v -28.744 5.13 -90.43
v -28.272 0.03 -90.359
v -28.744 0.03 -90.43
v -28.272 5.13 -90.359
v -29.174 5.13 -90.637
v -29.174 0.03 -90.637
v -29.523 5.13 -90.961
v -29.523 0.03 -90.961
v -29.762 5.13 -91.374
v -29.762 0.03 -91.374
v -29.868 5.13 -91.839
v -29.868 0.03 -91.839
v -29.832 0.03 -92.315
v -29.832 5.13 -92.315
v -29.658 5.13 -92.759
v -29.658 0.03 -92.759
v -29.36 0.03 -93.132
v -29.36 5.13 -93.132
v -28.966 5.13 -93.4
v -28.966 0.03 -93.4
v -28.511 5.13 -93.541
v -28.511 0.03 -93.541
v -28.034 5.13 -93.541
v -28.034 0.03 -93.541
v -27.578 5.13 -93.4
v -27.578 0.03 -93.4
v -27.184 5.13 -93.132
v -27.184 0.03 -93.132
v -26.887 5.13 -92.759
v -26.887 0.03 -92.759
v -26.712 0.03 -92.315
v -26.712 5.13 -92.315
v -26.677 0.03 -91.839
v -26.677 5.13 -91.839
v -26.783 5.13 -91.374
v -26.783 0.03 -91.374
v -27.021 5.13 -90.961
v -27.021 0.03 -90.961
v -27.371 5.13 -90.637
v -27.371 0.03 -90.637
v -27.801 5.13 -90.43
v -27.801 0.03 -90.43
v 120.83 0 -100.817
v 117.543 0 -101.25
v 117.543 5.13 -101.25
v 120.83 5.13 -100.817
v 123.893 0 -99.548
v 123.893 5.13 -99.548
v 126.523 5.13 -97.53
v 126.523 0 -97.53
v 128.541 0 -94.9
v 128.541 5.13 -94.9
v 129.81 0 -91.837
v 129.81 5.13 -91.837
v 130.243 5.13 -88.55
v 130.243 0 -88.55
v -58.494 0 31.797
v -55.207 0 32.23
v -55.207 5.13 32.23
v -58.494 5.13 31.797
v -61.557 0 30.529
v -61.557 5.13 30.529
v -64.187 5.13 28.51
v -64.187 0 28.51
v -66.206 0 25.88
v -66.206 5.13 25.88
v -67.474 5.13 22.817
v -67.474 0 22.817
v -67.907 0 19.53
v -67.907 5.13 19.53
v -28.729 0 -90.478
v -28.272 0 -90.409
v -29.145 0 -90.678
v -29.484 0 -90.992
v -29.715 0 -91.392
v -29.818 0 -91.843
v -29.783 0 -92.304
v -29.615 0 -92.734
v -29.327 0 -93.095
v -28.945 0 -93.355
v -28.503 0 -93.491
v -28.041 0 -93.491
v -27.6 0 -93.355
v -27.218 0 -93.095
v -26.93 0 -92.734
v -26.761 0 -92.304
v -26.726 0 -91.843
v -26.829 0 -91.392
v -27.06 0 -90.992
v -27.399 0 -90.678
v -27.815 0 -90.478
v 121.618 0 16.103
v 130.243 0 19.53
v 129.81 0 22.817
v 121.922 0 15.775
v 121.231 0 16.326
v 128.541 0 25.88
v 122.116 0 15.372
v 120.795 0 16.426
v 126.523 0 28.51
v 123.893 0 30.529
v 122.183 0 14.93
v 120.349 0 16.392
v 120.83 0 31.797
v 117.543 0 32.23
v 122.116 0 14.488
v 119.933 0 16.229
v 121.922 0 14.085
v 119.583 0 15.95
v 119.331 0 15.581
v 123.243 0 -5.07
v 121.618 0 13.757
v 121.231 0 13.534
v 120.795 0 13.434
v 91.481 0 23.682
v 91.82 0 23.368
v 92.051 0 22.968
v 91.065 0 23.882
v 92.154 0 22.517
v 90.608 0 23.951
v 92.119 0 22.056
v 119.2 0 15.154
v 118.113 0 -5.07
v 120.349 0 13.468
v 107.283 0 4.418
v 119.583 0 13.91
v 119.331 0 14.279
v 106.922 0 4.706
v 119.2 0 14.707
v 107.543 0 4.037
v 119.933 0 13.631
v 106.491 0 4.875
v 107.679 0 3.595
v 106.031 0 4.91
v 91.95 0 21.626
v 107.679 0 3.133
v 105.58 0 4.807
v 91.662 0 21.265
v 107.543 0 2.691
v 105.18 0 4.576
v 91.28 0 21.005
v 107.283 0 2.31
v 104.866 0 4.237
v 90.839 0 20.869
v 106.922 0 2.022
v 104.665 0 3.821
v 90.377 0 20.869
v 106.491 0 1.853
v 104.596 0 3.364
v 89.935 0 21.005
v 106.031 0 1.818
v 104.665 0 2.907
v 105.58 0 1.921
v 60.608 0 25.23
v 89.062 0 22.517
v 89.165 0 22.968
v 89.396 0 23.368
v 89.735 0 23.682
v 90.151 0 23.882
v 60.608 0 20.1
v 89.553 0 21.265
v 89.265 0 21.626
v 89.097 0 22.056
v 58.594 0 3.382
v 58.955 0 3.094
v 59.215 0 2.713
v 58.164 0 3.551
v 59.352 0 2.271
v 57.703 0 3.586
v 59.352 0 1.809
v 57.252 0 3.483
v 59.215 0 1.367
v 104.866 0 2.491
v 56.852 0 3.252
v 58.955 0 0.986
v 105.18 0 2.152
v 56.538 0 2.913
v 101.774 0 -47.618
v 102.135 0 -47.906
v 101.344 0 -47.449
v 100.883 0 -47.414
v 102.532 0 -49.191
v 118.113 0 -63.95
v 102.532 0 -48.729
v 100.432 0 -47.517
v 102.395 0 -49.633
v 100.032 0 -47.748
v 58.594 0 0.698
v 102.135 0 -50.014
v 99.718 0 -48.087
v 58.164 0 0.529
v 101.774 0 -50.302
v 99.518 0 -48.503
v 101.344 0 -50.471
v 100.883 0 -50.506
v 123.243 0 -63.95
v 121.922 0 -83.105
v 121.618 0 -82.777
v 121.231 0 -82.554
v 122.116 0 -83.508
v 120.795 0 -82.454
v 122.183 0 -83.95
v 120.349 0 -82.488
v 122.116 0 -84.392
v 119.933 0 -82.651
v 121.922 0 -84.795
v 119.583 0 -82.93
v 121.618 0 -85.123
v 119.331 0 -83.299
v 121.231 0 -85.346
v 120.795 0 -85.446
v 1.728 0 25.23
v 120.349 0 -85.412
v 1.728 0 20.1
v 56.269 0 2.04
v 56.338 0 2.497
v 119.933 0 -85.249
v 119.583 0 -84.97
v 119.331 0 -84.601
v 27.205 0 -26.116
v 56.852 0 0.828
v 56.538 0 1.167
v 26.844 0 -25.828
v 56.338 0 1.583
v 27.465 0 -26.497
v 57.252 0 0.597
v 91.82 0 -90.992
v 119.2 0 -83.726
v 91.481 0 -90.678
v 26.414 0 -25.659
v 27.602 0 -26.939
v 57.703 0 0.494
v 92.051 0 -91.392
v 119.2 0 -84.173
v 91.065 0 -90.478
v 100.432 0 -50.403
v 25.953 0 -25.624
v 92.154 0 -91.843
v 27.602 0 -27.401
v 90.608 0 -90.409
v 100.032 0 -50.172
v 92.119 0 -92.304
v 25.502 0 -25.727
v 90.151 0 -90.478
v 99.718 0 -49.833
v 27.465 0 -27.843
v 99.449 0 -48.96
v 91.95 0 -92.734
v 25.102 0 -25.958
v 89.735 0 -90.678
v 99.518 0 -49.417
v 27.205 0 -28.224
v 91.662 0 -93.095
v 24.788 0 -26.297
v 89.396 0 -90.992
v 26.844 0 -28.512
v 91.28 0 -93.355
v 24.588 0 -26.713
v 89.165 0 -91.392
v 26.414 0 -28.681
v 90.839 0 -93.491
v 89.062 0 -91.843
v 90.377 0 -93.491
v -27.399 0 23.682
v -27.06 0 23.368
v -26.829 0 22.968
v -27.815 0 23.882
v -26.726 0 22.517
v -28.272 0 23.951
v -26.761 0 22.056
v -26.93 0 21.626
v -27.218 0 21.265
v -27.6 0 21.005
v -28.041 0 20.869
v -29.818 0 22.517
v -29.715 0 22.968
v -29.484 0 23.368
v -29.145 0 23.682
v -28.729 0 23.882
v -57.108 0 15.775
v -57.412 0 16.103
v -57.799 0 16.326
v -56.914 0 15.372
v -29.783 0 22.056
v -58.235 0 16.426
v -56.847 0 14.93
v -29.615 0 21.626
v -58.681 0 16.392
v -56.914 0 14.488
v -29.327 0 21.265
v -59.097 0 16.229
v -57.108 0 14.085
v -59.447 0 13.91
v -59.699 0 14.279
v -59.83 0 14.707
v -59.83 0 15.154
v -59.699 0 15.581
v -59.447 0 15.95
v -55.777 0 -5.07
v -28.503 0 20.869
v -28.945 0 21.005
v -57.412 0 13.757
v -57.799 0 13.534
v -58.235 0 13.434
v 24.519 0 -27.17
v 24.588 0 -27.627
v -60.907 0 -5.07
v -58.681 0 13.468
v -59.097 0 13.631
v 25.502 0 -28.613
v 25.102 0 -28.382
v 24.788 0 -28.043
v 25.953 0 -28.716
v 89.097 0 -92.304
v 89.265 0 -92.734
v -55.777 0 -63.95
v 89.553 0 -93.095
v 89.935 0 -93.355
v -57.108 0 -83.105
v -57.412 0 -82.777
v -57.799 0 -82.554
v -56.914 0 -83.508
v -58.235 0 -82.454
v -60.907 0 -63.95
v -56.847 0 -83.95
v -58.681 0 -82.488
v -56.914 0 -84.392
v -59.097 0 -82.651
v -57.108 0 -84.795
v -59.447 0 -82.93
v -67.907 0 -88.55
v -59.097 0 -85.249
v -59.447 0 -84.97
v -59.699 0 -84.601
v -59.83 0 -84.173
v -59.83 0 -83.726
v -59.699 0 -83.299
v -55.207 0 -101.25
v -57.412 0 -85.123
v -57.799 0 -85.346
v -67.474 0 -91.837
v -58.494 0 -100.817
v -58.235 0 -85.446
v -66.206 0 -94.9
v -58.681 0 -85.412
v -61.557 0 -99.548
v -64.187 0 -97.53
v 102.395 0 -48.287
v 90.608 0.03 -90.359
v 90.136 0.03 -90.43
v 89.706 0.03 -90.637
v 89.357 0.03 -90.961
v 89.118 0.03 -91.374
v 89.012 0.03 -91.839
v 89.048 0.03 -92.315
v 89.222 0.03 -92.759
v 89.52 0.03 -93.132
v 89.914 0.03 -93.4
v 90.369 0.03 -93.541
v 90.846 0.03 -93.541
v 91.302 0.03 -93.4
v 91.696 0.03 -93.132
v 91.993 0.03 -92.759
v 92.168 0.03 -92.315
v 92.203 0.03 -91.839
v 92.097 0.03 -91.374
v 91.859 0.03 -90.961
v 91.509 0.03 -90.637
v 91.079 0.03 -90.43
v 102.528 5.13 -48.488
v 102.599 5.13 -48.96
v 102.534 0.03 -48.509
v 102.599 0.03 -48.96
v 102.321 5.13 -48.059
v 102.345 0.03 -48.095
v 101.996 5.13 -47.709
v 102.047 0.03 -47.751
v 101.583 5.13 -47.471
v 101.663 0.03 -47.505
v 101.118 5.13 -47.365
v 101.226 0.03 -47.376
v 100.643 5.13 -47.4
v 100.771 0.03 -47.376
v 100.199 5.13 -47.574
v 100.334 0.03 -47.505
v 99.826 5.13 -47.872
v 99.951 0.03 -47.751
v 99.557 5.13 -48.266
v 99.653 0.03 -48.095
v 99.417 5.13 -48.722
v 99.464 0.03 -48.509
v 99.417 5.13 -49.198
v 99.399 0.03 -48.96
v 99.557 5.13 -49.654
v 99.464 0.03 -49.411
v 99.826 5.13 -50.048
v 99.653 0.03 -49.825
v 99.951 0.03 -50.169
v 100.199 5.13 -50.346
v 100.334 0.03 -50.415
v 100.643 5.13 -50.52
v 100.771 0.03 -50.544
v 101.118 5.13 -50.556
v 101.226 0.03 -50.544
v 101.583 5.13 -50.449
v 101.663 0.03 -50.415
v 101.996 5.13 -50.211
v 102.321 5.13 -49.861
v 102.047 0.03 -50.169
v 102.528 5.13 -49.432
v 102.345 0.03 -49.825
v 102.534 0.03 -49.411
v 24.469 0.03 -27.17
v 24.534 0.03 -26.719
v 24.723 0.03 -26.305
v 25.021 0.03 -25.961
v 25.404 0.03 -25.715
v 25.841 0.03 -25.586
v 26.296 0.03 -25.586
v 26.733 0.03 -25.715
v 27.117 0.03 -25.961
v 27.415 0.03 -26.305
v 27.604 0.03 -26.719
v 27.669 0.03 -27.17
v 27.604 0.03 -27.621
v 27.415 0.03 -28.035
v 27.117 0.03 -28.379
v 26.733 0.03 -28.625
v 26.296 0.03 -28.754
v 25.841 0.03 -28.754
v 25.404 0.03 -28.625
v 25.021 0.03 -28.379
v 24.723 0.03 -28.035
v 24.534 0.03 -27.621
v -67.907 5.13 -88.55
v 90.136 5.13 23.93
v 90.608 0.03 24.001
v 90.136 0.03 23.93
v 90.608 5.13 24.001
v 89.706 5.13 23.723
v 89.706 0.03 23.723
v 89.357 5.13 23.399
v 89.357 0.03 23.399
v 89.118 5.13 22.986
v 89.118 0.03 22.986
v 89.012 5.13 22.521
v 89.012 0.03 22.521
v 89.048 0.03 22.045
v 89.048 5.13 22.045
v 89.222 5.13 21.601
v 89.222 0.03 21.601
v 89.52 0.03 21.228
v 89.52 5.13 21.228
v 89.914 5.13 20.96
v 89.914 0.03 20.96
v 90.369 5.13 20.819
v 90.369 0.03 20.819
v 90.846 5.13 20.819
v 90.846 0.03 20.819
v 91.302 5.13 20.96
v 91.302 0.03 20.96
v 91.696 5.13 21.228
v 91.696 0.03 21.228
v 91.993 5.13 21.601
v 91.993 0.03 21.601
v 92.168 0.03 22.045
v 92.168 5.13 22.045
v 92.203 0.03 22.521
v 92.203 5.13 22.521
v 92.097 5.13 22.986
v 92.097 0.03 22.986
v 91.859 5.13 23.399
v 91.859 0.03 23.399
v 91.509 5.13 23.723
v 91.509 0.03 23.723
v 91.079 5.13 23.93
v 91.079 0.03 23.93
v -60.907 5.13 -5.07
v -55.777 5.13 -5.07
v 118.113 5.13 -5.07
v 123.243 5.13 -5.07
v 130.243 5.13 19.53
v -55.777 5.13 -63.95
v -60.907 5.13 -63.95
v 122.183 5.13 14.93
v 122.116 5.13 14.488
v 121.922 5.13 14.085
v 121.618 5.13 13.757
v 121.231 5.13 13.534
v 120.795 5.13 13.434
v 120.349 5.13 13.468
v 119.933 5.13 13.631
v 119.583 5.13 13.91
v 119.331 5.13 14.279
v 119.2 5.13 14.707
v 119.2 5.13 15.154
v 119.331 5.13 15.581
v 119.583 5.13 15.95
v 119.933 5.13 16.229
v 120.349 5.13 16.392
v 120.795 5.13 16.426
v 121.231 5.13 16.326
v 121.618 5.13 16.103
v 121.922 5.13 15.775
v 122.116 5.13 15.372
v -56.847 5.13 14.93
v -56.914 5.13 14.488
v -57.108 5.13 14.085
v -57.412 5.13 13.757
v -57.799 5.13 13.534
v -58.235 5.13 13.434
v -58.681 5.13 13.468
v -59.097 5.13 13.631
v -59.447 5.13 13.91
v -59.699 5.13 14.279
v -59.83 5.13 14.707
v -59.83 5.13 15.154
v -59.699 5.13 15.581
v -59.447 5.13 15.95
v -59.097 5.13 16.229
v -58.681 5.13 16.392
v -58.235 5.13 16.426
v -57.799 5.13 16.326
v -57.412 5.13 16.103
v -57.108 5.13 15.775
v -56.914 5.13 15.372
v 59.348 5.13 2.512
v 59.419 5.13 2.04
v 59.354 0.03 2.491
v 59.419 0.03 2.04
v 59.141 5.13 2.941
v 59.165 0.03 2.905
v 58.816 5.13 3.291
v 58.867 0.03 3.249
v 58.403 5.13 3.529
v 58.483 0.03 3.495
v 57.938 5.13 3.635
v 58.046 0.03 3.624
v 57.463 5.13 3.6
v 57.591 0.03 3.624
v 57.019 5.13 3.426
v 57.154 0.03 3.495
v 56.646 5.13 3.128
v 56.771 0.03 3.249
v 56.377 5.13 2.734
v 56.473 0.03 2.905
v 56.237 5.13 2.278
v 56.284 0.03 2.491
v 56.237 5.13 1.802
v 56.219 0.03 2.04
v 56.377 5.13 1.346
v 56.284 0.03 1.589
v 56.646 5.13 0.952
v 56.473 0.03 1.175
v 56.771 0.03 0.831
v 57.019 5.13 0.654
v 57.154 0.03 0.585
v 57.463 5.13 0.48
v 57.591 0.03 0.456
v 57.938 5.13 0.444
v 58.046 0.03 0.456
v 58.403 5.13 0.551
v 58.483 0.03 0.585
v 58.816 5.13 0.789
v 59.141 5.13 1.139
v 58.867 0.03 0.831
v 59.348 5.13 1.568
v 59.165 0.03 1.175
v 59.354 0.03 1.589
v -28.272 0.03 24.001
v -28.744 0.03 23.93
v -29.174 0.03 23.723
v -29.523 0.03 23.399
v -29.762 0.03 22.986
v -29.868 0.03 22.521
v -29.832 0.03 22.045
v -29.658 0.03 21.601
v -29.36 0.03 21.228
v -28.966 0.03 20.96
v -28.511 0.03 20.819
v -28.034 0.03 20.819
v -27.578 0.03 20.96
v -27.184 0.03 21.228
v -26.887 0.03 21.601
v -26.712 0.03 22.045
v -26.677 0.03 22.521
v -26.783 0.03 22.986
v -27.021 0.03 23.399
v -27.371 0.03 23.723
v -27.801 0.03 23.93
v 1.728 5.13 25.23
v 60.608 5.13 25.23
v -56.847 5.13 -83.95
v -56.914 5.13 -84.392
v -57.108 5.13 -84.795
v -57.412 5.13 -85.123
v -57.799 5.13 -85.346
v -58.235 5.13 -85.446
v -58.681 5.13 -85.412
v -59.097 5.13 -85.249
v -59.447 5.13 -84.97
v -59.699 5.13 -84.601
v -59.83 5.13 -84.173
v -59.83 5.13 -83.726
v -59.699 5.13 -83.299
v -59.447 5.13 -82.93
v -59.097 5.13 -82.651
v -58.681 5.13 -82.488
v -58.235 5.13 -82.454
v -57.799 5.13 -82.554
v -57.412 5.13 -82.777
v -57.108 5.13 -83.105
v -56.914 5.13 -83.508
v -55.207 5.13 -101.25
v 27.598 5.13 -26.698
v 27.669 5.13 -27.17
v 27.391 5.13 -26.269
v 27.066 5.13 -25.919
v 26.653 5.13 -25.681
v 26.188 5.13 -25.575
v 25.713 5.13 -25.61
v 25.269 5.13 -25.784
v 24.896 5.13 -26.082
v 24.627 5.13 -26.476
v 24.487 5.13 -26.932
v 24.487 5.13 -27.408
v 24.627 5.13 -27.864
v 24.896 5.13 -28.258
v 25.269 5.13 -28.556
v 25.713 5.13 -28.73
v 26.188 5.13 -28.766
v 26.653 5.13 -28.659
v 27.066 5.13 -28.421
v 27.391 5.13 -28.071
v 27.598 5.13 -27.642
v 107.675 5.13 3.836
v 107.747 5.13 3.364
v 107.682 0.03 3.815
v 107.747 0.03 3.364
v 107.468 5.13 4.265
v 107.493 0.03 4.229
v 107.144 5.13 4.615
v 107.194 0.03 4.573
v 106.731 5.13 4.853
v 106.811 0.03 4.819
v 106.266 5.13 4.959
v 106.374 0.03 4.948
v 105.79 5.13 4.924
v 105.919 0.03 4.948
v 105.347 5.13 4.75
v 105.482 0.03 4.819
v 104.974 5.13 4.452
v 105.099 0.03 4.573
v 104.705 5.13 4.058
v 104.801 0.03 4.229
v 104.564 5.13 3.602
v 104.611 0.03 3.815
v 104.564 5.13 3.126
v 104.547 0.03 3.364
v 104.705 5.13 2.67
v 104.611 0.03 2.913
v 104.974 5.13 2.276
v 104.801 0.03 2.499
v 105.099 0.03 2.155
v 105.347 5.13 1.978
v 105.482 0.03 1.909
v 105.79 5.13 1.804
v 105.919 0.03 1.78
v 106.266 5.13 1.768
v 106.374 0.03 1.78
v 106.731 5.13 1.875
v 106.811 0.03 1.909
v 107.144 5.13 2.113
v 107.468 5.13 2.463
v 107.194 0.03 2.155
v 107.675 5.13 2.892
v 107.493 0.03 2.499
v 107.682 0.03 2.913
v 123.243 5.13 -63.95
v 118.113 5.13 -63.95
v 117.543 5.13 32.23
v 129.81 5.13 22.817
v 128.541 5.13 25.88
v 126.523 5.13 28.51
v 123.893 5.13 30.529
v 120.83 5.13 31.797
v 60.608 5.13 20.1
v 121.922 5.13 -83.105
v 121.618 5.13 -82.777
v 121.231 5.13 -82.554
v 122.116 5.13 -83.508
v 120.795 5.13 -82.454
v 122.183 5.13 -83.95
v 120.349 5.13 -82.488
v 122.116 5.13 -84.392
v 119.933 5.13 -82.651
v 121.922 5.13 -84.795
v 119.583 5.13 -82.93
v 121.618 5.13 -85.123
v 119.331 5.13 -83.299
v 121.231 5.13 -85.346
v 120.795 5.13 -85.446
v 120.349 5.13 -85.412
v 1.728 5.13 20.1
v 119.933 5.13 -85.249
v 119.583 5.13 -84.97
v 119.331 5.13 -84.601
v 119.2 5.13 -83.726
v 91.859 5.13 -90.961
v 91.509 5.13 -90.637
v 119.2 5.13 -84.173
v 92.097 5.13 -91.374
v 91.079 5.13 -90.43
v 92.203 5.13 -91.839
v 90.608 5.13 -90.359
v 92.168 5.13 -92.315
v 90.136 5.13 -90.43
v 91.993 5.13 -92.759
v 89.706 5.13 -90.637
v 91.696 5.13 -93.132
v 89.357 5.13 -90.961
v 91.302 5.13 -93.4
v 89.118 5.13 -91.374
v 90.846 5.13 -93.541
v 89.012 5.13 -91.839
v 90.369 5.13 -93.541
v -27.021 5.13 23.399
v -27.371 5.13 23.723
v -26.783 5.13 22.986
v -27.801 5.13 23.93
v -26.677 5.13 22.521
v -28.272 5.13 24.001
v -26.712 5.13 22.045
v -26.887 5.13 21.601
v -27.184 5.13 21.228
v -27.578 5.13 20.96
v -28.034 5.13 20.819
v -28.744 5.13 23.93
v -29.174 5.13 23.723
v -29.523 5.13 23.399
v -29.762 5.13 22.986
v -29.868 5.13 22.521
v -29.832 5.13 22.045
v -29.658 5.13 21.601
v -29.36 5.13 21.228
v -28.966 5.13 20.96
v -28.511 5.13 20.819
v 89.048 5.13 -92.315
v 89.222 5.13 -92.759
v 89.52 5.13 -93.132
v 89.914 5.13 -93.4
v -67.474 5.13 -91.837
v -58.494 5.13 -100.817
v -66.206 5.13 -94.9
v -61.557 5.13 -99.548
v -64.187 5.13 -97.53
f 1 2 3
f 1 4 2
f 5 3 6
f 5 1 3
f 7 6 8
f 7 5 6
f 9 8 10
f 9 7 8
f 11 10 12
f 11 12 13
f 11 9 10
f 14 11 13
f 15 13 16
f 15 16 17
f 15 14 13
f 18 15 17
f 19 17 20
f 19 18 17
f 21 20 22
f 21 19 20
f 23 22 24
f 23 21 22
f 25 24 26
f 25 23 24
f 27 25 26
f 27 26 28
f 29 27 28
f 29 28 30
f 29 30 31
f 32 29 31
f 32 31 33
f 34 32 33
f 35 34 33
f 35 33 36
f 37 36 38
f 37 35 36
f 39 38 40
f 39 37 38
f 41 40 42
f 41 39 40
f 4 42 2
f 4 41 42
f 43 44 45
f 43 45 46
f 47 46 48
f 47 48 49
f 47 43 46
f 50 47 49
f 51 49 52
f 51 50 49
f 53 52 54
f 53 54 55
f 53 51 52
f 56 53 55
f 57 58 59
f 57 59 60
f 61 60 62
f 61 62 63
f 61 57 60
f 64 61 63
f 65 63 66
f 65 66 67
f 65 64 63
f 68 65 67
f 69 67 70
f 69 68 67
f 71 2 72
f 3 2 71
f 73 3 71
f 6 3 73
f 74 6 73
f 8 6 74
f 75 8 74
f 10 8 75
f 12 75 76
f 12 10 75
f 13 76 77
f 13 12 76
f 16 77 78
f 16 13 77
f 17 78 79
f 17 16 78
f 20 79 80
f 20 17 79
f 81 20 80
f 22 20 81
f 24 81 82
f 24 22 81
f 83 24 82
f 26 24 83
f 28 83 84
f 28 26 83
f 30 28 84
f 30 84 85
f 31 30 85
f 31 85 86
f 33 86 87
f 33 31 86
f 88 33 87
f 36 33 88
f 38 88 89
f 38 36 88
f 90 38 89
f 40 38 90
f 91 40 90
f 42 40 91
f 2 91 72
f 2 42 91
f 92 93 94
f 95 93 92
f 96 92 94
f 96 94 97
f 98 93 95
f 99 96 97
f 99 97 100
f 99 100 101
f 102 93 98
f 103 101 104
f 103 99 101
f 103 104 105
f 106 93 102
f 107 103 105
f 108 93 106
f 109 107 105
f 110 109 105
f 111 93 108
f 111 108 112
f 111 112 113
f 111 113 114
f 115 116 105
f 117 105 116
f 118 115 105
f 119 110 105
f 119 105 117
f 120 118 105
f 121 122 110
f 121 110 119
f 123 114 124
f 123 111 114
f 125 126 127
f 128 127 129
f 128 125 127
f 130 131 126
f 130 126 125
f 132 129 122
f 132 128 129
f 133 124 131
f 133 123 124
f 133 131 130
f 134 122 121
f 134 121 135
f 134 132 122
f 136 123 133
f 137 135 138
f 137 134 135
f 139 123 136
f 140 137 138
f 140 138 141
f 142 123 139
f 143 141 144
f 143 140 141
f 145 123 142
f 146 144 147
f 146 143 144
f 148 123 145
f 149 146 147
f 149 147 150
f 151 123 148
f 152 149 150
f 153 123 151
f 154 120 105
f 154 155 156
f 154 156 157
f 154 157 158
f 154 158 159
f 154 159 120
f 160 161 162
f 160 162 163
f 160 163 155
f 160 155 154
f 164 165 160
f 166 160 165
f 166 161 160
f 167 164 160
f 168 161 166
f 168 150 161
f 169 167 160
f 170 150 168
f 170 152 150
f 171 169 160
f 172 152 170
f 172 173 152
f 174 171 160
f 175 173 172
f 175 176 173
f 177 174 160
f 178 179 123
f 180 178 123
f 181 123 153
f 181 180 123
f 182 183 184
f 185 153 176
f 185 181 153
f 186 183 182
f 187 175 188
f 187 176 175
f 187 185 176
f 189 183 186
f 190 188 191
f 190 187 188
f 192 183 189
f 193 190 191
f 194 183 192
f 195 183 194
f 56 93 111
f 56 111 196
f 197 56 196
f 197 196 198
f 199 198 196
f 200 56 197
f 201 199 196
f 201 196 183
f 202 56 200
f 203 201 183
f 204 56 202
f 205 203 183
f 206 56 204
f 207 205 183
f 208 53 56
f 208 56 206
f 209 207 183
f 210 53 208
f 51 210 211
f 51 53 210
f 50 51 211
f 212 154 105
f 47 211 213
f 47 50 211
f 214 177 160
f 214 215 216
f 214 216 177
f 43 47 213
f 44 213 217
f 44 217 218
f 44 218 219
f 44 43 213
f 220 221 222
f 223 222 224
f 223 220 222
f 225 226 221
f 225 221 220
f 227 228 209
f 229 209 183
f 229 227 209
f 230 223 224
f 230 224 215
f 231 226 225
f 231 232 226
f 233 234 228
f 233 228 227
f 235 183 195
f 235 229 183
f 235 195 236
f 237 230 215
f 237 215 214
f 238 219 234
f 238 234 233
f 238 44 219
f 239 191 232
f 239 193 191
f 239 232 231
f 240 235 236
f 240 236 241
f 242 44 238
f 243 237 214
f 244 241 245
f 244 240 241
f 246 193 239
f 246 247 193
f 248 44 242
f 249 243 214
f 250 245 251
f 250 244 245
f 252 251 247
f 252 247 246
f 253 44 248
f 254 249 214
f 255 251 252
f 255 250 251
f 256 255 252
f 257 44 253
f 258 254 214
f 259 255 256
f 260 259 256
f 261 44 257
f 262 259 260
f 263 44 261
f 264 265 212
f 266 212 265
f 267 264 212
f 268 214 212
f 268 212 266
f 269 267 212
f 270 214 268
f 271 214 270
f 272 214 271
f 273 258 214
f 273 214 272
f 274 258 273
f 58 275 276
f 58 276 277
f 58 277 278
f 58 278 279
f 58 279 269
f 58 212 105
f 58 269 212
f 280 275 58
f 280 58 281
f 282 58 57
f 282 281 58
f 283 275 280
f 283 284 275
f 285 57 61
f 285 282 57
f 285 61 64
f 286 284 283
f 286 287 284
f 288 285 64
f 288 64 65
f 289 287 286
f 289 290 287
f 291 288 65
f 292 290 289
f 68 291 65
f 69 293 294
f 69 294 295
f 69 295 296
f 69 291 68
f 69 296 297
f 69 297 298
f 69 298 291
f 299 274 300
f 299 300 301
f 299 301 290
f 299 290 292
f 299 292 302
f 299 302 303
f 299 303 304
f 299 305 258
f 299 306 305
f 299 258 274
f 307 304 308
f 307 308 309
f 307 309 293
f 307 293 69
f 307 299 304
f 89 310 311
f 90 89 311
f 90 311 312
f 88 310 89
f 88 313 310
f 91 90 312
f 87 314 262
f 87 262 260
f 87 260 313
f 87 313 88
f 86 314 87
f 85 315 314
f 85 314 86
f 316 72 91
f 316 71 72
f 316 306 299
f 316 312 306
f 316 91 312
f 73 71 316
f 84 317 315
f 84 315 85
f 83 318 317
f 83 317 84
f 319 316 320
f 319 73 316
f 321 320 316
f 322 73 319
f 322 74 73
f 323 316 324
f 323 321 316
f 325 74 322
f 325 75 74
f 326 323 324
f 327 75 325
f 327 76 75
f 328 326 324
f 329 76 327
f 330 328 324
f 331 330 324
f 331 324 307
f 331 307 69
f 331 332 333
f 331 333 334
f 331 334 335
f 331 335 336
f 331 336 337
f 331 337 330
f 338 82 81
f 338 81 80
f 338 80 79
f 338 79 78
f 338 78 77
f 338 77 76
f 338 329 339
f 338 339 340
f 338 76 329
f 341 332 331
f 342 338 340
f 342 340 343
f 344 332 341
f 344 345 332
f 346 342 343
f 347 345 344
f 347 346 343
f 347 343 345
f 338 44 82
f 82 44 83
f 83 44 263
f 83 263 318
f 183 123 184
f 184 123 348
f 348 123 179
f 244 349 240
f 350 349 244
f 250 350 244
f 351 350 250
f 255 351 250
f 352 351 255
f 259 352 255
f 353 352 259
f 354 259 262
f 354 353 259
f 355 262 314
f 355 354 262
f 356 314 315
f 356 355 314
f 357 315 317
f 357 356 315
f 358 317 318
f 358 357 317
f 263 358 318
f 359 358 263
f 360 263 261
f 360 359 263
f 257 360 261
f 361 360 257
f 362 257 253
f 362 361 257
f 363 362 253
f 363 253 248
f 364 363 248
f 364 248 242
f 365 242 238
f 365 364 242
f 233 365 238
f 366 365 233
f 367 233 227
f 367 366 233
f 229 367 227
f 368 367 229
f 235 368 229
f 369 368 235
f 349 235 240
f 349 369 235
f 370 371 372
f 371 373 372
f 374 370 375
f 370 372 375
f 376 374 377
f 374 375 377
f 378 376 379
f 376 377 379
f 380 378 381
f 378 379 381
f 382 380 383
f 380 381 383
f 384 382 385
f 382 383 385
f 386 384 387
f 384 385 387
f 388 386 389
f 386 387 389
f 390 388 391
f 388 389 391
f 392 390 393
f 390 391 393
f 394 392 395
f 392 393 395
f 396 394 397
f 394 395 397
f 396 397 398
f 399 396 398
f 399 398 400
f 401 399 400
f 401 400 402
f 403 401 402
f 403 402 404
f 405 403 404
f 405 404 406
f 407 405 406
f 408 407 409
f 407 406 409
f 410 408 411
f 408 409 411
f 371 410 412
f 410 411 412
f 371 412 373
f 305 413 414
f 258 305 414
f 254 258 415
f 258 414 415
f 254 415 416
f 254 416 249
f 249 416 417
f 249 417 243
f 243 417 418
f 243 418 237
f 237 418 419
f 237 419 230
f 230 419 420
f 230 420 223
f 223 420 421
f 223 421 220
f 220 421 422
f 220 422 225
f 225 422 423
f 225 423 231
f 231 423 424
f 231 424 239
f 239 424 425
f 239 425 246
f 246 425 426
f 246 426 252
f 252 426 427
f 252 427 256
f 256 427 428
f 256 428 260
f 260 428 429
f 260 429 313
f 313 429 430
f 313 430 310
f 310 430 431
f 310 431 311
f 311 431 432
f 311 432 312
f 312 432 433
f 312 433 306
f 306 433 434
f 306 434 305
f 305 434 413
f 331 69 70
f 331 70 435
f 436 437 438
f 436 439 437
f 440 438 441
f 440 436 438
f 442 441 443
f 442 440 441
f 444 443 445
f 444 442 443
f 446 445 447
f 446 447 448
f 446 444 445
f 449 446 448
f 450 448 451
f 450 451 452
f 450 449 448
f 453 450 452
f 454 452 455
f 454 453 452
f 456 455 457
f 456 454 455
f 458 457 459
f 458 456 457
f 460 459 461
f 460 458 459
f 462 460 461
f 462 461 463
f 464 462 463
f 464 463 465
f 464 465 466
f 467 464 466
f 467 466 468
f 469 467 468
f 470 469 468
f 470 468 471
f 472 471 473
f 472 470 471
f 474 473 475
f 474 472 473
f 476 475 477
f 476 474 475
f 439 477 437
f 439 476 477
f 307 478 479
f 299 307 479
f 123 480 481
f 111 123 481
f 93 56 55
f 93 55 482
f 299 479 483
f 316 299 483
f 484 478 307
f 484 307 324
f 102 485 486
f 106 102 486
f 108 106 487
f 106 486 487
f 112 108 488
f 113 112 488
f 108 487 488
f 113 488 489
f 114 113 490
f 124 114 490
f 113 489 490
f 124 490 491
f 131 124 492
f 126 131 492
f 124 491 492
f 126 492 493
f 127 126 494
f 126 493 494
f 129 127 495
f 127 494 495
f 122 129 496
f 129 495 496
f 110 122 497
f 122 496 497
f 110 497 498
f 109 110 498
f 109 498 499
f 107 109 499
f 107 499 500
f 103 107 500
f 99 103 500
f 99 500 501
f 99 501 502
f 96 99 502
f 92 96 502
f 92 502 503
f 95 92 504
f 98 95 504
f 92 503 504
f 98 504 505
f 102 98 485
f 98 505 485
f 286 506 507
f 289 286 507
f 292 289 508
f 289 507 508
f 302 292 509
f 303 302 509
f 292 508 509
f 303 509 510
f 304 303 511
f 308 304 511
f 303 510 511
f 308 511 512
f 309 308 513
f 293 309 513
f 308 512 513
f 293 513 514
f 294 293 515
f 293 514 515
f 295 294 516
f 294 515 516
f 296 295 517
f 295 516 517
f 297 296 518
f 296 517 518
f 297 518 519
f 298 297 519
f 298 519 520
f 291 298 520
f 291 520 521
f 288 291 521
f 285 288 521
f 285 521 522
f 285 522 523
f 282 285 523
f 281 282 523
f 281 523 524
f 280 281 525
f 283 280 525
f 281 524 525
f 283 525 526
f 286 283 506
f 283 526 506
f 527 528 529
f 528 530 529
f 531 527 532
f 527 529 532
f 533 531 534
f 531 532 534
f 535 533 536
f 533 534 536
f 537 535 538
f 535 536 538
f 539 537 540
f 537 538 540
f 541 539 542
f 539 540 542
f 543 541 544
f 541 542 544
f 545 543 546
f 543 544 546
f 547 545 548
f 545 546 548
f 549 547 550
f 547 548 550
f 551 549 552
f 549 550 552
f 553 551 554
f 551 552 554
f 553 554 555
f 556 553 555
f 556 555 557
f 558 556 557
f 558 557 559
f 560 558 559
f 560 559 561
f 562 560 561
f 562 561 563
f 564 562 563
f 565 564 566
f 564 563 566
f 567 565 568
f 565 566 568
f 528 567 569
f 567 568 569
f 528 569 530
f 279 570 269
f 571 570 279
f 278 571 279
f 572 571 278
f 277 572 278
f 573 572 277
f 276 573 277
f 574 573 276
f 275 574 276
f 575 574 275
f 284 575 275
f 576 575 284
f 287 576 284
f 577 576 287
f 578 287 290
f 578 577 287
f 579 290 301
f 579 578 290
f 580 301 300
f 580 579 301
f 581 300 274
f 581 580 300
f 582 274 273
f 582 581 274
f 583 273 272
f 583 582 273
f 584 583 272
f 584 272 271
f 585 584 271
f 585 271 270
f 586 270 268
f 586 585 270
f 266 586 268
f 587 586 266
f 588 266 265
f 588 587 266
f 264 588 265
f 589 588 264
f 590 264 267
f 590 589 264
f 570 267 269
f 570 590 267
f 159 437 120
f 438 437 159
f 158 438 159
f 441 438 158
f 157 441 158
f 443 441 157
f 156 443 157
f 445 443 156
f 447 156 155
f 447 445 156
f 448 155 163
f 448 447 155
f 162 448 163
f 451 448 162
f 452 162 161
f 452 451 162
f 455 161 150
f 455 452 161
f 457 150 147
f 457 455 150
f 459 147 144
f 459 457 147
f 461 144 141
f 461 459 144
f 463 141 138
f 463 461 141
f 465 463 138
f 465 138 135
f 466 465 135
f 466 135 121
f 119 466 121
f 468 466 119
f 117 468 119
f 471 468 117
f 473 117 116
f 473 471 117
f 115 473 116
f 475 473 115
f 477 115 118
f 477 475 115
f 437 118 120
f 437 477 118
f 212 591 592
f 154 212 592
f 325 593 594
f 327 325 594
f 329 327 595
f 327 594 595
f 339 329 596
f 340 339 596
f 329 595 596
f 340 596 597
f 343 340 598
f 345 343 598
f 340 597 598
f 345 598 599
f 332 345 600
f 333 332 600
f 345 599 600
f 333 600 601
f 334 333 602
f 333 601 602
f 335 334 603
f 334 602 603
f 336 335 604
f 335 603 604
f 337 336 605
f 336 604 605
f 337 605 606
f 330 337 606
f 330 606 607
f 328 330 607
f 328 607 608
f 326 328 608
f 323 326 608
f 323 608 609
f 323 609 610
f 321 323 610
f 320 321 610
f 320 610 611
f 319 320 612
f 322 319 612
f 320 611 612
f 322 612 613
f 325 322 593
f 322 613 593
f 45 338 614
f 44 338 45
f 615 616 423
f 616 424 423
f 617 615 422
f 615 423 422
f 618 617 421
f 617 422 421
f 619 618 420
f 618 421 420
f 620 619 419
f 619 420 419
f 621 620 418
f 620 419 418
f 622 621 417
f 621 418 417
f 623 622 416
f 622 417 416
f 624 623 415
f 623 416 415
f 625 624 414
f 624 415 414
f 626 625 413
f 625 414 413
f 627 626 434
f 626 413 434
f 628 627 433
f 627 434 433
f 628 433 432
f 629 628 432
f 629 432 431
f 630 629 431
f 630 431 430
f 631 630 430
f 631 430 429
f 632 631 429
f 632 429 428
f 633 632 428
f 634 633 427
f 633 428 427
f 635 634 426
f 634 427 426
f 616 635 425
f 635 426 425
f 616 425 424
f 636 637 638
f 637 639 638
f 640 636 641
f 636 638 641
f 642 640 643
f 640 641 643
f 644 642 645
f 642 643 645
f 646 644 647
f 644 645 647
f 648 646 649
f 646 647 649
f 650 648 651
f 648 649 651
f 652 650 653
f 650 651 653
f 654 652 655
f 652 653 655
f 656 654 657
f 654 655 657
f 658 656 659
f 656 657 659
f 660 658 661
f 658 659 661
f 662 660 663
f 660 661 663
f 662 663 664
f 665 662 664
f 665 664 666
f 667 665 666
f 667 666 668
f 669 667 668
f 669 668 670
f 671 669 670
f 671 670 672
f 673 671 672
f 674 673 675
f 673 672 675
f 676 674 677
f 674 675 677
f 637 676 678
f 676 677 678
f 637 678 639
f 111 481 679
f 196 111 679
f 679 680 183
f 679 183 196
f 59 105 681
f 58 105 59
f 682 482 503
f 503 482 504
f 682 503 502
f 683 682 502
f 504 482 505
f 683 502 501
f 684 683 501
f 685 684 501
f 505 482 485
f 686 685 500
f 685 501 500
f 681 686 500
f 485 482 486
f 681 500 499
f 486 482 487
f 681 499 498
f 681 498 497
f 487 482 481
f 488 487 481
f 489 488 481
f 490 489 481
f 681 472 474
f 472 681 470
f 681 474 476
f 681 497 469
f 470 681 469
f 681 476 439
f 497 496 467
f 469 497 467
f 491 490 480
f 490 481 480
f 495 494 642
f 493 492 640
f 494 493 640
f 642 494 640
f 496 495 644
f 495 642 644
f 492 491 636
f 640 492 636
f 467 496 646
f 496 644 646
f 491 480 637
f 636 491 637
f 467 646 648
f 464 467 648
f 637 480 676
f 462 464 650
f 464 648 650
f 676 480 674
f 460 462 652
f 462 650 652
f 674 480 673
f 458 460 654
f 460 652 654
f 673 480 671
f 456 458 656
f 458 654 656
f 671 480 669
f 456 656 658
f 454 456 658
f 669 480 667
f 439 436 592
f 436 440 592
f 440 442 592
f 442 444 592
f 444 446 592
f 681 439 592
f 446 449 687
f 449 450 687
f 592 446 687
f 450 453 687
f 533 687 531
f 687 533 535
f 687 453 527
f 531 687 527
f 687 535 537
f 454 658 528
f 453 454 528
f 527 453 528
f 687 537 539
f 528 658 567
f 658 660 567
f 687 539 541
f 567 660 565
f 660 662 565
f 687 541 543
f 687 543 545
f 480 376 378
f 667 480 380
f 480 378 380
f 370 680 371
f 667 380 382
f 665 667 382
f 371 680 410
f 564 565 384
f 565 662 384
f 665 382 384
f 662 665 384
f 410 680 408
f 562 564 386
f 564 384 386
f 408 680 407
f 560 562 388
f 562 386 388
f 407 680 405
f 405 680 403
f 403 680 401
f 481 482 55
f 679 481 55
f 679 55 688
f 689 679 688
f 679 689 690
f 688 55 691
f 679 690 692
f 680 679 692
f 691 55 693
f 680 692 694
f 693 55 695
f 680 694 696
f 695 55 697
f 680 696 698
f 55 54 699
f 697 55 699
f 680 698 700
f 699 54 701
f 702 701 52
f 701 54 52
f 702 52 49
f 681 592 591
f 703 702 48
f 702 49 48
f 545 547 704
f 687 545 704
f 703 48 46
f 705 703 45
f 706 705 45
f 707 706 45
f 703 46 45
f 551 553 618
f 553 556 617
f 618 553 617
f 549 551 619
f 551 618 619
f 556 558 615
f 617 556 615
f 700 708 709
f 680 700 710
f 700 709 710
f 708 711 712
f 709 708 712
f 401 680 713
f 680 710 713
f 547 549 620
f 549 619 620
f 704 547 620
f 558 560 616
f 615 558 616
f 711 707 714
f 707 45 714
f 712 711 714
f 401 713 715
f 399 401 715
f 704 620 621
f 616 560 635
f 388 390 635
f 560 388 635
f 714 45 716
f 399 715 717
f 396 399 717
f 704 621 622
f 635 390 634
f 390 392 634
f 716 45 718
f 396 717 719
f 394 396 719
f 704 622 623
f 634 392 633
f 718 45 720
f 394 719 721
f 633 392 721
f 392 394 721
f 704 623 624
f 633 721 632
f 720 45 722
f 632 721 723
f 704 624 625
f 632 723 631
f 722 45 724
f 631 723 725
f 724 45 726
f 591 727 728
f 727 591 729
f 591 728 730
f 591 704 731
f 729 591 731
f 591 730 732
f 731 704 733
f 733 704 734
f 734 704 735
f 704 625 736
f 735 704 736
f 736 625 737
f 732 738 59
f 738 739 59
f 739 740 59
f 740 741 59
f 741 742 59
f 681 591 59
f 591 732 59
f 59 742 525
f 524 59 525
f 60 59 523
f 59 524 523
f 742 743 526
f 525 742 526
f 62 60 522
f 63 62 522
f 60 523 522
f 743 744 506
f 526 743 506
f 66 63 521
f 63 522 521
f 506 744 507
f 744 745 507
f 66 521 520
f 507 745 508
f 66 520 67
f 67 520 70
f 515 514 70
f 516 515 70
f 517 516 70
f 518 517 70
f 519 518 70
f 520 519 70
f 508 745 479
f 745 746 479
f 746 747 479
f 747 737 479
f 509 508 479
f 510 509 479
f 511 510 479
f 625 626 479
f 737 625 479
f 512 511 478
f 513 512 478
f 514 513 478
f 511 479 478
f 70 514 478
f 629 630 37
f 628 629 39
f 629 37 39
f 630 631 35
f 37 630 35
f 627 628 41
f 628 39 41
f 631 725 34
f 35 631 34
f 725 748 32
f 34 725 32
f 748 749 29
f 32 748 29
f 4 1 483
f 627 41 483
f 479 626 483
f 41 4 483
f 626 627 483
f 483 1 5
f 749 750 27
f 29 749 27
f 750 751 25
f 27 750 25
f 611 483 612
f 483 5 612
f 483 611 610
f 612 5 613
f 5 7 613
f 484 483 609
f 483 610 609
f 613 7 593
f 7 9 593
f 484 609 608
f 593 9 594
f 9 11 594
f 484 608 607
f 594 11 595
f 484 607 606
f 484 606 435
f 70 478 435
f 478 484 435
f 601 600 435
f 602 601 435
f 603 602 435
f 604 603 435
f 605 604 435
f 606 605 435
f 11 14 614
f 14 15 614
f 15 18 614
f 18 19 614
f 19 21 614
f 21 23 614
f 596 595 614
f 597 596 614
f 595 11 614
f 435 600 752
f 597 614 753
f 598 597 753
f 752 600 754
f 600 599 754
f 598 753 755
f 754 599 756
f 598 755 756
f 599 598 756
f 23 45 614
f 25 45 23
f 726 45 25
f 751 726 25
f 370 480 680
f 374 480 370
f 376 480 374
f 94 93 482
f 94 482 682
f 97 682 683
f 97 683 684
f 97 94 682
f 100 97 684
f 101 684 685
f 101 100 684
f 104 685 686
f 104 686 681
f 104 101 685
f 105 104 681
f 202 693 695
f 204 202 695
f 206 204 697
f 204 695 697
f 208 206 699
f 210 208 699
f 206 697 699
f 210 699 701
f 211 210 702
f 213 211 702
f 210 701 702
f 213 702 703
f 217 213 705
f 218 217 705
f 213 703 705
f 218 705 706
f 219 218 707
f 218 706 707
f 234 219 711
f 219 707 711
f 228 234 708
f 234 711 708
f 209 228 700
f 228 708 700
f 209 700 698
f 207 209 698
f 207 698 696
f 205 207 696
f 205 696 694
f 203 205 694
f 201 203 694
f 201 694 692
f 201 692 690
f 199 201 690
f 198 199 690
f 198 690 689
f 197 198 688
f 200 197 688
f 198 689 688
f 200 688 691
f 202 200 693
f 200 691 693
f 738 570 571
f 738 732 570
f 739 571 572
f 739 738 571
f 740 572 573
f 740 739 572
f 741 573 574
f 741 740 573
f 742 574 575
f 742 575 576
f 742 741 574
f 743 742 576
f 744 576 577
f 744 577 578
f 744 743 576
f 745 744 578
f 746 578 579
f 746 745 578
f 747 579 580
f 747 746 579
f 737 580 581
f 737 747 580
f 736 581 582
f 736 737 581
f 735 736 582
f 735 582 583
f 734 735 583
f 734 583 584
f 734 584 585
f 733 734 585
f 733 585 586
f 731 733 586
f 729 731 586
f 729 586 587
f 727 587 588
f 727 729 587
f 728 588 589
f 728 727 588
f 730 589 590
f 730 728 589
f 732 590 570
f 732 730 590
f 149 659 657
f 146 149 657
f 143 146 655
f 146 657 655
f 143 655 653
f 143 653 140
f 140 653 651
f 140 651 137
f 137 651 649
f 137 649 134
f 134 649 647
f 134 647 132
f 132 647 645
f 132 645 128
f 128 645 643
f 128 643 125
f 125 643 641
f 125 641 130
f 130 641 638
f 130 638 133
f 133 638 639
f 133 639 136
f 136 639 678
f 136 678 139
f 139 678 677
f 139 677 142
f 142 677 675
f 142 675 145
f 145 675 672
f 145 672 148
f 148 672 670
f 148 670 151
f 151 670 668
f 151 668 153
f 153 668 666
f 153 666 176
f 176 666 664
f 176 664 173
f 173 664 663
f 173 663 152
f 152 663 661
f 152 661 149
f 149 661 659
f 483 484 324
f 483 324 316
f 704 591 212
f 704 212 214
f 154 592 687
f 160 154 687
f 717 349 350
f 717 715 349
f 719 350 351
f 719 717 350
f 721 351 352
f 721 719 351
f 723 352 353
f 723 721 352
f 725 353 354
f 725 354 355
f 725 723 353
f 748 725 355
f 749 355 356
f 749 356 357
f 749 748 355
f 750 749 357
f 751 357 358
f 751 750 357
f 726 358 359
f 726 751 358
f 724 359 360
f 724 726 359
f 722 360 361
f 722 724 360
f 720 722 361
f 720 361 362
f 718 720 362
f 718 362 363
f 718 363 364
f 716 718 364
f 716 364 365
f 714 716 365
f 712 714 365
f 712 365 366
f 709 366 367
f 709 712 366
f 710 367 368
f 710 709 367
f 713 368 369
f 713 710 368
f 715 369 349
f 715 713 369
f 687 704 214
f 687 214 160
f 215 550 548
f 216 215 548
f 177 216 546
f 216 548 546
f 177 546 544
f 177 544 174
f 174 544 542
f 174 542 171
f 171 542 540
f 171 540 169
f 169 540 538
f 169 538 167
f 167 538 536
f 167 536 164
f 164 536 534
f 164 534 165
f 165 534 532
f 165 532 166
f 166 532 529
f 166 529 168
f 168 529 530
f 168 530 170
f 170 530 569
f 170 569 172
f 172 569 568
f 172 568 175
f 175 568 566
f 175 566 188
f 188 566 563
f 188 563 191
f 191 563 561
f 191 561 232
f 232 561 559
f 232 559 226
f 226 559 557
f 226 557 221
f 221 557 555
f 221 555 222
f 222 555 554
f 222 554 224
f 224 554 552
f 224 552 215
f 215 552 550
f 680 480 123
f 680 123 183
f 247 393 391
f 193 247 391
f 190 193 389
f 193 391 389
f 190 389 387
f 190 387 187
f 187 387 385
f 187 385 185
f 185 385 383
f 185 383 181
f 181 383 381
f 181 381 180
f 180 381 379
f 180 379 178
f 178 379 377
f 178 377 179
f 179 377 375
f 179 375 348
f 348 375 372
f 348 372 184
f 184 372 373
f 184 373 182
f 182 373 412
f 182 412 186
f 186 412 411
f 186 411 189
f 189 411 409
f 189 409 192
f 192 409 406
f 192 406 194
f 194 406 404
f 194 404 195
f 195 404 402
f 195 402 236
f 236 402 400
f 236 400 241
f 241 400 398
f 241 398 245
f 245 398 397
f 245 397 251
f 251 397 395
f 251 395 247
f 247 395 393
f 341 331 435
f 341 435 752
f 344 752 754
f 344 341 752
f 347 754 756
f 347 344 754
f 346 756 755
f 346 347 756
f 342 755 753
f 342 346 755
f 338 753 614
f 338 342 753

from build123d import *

# Parameters (mm, degrees)
MAIN_DEPTH               = 5.13
SKETCH2_R                = 1.5
SKETCH2_W                = 5.13
SKETCH2_H                = 58.88
CUT_EXTRUDE1_DEPTH       = 5.13
TOOTH_SLOT_REACH         = 7.13
SKETCH3_W                = 58.88
SKETCH3_H                = 5.13
LPATTERN1_COUNT          = 2
LPATTERN1_PITCH          = 118.88
LPATTERN1_COUNT_DIR2     = 2
LPATTERN1_PITCH_DIR2     = 114.36
M3_CLEARANCE_HOLE4_D     = 3.2
M3_CLEARANCE_HOLE4_DEPTH = 5.1
M3_CLEARANCE_HOLE4_TIP   = 0.96137699


with BuildPart() as part:
    # Sketch1 → Main (new body)
    with BuildSketch(Plane(origin=(0, 0, 0), x_dir=(1, 0, 0), z_dir=(0, 1, 0))):
        with BuildLine():
            Line((-55.207201859, 101.249932113), (117.542798141, 101.249932113))
            ThreePointArc((117.542798141, 101.249932113), (126.523054262, 97.530188234), (130.242798141, 88.549932113))
            Line((130.242798141, 88.549932113), (130.242798141, -19.530067887))
            ThreePointArc((130.242798141, -19.530067887), (126.523054262, -28.510324008), (117.542798141, -32.230067887))
            Line((117.542798141, -32.230067887), (-55.207201859, -32.230067887))
            ThreePointArc((-55.207201859, -32.230067887), (-64.18745798, -28.510324008), (-67.907201859, -19.530067887))
            Line((-67.907201859, -19.530067887), (-67.907201859, 88.549932113))
            ThreePointArc((-67.907201859, 88.549932113), (-64.18745798, 97.530188234), (-55.207201859, 101.249932113))
        make_face()
    extrude(amount=MAIN_DEPTH)

    # Sketch2 → Cut-Extrude1 (cut)
    with BuildSketch(Plane(origin=(0, 5.13, 0), x_dir=(1, 0, 0), z_dir=(0, 1, 0))):
        with Locations((-58.347201859, -14.930067887)):
            Circle(SKETCH2_R)
        with Locations((-58.347201859, 83.949932113)):
            Circle(SKETCH2_R)
        with Locations((120.682798141, 83.949932113)):
            Circle(SKETCH2_R)
        with Locations((120.682798141, -14.930067887)):
            Circle(SKETCH2_R)
        with Locations((-58.342201859, 34.509932113)):
            Rectangle(SKETCH2_W, SKETCH2_H)
        with Locations((120.677798141, 34.509932113)):
            Rectangle(SKETCH2_W, SKETCH2_H)
    extrude(amount=-CUT_EXTRUDE1_DEPTH, mode=Mode.SUBTRACT)

    # Sketch3 → tooth slot (cut, up to next)
    with BuildSketch(Plane(origin=(0, 5.13, 0), x_dir=(1, 0, 0), z_dir=(0, 1, 0)), mode=Mode.PRIVATE) as tooth_slot_sk1:
        with Locations((31.167798141, -22.665067887)):
            Rectangle(SKETCH3_W, SKETCH3_H)
    tooth_slot_tool1 = extrude(tooth_slot_sk1.sketch, amount=-TOOTH_SLOT_REACH, mode=Mode.PRIVATE) & part.part
    add(tooth_slot_tool1.solids().sort_by_distance((31.167798, 5.13, 22.665068))[0], mode=Mode.SUBTRACT)

    # Sketch4 → M3 Clearance Hole1 (revolve, cut)
    with BuildSketch(Plane(origin=(-28.272201859, 5.13, 22.401258672), x_dir=(0, 0, 1), z_dir=(1, 0, 0))):
        Polygon((0, 0), (0, 6.06137699), (1.6, 5.1), (1.6, 0), align=None)
    m3_clearance_hole1 = revolve(axis=Axis((-28.272201859, 11.48, 22.401258672), (0, -1, 0)), mode=Mode.SUBTRACT)

    # LPattern1: M3 Clearance Hole1 2 × 2
    with Locations(*[(i * LPATTERN1_PITCH, 0, -j * LPATTERN1_PITCH_DIR2) for i in range(LPATTERN1_COUNT) for j in range(LPATTERN1_COUNT_DIR2) if (i, j) != (0, 0)]):
        add(m3_clearance_hole1, mode=Mode.SUBTRACT)

    # M3 Clearance Hole4
    with Locations(Plane(origin=(0, 5.13, 0), x_dir=(-1, 0, 0), z_dir=(0, 1, 0))):
        with Locations((-100.998782657, -48.960031461), (-106.146516037, 3.363968539), (-57.818782657, 2.039968539), (-26.068782657, -27.170031461)):
            Hole(M3_CLEARANCE_HOLE4_D / 2, depth=M3_CLEARANCE_HOLE4_DEPTH)
            with Locations((0, 0, -(M3_CLEARANCE_HOLE4_DEPTH + M3_CLEARANCE_HOLE4_TIP / 2))):  # 118° drill point
                Cone(0, M3_CLEARANCE_HOLE4_D / 2, M3_CLEARANCE_HOLE4_TIP, mode=Mode.SUBTRACT)


solid = part.part
